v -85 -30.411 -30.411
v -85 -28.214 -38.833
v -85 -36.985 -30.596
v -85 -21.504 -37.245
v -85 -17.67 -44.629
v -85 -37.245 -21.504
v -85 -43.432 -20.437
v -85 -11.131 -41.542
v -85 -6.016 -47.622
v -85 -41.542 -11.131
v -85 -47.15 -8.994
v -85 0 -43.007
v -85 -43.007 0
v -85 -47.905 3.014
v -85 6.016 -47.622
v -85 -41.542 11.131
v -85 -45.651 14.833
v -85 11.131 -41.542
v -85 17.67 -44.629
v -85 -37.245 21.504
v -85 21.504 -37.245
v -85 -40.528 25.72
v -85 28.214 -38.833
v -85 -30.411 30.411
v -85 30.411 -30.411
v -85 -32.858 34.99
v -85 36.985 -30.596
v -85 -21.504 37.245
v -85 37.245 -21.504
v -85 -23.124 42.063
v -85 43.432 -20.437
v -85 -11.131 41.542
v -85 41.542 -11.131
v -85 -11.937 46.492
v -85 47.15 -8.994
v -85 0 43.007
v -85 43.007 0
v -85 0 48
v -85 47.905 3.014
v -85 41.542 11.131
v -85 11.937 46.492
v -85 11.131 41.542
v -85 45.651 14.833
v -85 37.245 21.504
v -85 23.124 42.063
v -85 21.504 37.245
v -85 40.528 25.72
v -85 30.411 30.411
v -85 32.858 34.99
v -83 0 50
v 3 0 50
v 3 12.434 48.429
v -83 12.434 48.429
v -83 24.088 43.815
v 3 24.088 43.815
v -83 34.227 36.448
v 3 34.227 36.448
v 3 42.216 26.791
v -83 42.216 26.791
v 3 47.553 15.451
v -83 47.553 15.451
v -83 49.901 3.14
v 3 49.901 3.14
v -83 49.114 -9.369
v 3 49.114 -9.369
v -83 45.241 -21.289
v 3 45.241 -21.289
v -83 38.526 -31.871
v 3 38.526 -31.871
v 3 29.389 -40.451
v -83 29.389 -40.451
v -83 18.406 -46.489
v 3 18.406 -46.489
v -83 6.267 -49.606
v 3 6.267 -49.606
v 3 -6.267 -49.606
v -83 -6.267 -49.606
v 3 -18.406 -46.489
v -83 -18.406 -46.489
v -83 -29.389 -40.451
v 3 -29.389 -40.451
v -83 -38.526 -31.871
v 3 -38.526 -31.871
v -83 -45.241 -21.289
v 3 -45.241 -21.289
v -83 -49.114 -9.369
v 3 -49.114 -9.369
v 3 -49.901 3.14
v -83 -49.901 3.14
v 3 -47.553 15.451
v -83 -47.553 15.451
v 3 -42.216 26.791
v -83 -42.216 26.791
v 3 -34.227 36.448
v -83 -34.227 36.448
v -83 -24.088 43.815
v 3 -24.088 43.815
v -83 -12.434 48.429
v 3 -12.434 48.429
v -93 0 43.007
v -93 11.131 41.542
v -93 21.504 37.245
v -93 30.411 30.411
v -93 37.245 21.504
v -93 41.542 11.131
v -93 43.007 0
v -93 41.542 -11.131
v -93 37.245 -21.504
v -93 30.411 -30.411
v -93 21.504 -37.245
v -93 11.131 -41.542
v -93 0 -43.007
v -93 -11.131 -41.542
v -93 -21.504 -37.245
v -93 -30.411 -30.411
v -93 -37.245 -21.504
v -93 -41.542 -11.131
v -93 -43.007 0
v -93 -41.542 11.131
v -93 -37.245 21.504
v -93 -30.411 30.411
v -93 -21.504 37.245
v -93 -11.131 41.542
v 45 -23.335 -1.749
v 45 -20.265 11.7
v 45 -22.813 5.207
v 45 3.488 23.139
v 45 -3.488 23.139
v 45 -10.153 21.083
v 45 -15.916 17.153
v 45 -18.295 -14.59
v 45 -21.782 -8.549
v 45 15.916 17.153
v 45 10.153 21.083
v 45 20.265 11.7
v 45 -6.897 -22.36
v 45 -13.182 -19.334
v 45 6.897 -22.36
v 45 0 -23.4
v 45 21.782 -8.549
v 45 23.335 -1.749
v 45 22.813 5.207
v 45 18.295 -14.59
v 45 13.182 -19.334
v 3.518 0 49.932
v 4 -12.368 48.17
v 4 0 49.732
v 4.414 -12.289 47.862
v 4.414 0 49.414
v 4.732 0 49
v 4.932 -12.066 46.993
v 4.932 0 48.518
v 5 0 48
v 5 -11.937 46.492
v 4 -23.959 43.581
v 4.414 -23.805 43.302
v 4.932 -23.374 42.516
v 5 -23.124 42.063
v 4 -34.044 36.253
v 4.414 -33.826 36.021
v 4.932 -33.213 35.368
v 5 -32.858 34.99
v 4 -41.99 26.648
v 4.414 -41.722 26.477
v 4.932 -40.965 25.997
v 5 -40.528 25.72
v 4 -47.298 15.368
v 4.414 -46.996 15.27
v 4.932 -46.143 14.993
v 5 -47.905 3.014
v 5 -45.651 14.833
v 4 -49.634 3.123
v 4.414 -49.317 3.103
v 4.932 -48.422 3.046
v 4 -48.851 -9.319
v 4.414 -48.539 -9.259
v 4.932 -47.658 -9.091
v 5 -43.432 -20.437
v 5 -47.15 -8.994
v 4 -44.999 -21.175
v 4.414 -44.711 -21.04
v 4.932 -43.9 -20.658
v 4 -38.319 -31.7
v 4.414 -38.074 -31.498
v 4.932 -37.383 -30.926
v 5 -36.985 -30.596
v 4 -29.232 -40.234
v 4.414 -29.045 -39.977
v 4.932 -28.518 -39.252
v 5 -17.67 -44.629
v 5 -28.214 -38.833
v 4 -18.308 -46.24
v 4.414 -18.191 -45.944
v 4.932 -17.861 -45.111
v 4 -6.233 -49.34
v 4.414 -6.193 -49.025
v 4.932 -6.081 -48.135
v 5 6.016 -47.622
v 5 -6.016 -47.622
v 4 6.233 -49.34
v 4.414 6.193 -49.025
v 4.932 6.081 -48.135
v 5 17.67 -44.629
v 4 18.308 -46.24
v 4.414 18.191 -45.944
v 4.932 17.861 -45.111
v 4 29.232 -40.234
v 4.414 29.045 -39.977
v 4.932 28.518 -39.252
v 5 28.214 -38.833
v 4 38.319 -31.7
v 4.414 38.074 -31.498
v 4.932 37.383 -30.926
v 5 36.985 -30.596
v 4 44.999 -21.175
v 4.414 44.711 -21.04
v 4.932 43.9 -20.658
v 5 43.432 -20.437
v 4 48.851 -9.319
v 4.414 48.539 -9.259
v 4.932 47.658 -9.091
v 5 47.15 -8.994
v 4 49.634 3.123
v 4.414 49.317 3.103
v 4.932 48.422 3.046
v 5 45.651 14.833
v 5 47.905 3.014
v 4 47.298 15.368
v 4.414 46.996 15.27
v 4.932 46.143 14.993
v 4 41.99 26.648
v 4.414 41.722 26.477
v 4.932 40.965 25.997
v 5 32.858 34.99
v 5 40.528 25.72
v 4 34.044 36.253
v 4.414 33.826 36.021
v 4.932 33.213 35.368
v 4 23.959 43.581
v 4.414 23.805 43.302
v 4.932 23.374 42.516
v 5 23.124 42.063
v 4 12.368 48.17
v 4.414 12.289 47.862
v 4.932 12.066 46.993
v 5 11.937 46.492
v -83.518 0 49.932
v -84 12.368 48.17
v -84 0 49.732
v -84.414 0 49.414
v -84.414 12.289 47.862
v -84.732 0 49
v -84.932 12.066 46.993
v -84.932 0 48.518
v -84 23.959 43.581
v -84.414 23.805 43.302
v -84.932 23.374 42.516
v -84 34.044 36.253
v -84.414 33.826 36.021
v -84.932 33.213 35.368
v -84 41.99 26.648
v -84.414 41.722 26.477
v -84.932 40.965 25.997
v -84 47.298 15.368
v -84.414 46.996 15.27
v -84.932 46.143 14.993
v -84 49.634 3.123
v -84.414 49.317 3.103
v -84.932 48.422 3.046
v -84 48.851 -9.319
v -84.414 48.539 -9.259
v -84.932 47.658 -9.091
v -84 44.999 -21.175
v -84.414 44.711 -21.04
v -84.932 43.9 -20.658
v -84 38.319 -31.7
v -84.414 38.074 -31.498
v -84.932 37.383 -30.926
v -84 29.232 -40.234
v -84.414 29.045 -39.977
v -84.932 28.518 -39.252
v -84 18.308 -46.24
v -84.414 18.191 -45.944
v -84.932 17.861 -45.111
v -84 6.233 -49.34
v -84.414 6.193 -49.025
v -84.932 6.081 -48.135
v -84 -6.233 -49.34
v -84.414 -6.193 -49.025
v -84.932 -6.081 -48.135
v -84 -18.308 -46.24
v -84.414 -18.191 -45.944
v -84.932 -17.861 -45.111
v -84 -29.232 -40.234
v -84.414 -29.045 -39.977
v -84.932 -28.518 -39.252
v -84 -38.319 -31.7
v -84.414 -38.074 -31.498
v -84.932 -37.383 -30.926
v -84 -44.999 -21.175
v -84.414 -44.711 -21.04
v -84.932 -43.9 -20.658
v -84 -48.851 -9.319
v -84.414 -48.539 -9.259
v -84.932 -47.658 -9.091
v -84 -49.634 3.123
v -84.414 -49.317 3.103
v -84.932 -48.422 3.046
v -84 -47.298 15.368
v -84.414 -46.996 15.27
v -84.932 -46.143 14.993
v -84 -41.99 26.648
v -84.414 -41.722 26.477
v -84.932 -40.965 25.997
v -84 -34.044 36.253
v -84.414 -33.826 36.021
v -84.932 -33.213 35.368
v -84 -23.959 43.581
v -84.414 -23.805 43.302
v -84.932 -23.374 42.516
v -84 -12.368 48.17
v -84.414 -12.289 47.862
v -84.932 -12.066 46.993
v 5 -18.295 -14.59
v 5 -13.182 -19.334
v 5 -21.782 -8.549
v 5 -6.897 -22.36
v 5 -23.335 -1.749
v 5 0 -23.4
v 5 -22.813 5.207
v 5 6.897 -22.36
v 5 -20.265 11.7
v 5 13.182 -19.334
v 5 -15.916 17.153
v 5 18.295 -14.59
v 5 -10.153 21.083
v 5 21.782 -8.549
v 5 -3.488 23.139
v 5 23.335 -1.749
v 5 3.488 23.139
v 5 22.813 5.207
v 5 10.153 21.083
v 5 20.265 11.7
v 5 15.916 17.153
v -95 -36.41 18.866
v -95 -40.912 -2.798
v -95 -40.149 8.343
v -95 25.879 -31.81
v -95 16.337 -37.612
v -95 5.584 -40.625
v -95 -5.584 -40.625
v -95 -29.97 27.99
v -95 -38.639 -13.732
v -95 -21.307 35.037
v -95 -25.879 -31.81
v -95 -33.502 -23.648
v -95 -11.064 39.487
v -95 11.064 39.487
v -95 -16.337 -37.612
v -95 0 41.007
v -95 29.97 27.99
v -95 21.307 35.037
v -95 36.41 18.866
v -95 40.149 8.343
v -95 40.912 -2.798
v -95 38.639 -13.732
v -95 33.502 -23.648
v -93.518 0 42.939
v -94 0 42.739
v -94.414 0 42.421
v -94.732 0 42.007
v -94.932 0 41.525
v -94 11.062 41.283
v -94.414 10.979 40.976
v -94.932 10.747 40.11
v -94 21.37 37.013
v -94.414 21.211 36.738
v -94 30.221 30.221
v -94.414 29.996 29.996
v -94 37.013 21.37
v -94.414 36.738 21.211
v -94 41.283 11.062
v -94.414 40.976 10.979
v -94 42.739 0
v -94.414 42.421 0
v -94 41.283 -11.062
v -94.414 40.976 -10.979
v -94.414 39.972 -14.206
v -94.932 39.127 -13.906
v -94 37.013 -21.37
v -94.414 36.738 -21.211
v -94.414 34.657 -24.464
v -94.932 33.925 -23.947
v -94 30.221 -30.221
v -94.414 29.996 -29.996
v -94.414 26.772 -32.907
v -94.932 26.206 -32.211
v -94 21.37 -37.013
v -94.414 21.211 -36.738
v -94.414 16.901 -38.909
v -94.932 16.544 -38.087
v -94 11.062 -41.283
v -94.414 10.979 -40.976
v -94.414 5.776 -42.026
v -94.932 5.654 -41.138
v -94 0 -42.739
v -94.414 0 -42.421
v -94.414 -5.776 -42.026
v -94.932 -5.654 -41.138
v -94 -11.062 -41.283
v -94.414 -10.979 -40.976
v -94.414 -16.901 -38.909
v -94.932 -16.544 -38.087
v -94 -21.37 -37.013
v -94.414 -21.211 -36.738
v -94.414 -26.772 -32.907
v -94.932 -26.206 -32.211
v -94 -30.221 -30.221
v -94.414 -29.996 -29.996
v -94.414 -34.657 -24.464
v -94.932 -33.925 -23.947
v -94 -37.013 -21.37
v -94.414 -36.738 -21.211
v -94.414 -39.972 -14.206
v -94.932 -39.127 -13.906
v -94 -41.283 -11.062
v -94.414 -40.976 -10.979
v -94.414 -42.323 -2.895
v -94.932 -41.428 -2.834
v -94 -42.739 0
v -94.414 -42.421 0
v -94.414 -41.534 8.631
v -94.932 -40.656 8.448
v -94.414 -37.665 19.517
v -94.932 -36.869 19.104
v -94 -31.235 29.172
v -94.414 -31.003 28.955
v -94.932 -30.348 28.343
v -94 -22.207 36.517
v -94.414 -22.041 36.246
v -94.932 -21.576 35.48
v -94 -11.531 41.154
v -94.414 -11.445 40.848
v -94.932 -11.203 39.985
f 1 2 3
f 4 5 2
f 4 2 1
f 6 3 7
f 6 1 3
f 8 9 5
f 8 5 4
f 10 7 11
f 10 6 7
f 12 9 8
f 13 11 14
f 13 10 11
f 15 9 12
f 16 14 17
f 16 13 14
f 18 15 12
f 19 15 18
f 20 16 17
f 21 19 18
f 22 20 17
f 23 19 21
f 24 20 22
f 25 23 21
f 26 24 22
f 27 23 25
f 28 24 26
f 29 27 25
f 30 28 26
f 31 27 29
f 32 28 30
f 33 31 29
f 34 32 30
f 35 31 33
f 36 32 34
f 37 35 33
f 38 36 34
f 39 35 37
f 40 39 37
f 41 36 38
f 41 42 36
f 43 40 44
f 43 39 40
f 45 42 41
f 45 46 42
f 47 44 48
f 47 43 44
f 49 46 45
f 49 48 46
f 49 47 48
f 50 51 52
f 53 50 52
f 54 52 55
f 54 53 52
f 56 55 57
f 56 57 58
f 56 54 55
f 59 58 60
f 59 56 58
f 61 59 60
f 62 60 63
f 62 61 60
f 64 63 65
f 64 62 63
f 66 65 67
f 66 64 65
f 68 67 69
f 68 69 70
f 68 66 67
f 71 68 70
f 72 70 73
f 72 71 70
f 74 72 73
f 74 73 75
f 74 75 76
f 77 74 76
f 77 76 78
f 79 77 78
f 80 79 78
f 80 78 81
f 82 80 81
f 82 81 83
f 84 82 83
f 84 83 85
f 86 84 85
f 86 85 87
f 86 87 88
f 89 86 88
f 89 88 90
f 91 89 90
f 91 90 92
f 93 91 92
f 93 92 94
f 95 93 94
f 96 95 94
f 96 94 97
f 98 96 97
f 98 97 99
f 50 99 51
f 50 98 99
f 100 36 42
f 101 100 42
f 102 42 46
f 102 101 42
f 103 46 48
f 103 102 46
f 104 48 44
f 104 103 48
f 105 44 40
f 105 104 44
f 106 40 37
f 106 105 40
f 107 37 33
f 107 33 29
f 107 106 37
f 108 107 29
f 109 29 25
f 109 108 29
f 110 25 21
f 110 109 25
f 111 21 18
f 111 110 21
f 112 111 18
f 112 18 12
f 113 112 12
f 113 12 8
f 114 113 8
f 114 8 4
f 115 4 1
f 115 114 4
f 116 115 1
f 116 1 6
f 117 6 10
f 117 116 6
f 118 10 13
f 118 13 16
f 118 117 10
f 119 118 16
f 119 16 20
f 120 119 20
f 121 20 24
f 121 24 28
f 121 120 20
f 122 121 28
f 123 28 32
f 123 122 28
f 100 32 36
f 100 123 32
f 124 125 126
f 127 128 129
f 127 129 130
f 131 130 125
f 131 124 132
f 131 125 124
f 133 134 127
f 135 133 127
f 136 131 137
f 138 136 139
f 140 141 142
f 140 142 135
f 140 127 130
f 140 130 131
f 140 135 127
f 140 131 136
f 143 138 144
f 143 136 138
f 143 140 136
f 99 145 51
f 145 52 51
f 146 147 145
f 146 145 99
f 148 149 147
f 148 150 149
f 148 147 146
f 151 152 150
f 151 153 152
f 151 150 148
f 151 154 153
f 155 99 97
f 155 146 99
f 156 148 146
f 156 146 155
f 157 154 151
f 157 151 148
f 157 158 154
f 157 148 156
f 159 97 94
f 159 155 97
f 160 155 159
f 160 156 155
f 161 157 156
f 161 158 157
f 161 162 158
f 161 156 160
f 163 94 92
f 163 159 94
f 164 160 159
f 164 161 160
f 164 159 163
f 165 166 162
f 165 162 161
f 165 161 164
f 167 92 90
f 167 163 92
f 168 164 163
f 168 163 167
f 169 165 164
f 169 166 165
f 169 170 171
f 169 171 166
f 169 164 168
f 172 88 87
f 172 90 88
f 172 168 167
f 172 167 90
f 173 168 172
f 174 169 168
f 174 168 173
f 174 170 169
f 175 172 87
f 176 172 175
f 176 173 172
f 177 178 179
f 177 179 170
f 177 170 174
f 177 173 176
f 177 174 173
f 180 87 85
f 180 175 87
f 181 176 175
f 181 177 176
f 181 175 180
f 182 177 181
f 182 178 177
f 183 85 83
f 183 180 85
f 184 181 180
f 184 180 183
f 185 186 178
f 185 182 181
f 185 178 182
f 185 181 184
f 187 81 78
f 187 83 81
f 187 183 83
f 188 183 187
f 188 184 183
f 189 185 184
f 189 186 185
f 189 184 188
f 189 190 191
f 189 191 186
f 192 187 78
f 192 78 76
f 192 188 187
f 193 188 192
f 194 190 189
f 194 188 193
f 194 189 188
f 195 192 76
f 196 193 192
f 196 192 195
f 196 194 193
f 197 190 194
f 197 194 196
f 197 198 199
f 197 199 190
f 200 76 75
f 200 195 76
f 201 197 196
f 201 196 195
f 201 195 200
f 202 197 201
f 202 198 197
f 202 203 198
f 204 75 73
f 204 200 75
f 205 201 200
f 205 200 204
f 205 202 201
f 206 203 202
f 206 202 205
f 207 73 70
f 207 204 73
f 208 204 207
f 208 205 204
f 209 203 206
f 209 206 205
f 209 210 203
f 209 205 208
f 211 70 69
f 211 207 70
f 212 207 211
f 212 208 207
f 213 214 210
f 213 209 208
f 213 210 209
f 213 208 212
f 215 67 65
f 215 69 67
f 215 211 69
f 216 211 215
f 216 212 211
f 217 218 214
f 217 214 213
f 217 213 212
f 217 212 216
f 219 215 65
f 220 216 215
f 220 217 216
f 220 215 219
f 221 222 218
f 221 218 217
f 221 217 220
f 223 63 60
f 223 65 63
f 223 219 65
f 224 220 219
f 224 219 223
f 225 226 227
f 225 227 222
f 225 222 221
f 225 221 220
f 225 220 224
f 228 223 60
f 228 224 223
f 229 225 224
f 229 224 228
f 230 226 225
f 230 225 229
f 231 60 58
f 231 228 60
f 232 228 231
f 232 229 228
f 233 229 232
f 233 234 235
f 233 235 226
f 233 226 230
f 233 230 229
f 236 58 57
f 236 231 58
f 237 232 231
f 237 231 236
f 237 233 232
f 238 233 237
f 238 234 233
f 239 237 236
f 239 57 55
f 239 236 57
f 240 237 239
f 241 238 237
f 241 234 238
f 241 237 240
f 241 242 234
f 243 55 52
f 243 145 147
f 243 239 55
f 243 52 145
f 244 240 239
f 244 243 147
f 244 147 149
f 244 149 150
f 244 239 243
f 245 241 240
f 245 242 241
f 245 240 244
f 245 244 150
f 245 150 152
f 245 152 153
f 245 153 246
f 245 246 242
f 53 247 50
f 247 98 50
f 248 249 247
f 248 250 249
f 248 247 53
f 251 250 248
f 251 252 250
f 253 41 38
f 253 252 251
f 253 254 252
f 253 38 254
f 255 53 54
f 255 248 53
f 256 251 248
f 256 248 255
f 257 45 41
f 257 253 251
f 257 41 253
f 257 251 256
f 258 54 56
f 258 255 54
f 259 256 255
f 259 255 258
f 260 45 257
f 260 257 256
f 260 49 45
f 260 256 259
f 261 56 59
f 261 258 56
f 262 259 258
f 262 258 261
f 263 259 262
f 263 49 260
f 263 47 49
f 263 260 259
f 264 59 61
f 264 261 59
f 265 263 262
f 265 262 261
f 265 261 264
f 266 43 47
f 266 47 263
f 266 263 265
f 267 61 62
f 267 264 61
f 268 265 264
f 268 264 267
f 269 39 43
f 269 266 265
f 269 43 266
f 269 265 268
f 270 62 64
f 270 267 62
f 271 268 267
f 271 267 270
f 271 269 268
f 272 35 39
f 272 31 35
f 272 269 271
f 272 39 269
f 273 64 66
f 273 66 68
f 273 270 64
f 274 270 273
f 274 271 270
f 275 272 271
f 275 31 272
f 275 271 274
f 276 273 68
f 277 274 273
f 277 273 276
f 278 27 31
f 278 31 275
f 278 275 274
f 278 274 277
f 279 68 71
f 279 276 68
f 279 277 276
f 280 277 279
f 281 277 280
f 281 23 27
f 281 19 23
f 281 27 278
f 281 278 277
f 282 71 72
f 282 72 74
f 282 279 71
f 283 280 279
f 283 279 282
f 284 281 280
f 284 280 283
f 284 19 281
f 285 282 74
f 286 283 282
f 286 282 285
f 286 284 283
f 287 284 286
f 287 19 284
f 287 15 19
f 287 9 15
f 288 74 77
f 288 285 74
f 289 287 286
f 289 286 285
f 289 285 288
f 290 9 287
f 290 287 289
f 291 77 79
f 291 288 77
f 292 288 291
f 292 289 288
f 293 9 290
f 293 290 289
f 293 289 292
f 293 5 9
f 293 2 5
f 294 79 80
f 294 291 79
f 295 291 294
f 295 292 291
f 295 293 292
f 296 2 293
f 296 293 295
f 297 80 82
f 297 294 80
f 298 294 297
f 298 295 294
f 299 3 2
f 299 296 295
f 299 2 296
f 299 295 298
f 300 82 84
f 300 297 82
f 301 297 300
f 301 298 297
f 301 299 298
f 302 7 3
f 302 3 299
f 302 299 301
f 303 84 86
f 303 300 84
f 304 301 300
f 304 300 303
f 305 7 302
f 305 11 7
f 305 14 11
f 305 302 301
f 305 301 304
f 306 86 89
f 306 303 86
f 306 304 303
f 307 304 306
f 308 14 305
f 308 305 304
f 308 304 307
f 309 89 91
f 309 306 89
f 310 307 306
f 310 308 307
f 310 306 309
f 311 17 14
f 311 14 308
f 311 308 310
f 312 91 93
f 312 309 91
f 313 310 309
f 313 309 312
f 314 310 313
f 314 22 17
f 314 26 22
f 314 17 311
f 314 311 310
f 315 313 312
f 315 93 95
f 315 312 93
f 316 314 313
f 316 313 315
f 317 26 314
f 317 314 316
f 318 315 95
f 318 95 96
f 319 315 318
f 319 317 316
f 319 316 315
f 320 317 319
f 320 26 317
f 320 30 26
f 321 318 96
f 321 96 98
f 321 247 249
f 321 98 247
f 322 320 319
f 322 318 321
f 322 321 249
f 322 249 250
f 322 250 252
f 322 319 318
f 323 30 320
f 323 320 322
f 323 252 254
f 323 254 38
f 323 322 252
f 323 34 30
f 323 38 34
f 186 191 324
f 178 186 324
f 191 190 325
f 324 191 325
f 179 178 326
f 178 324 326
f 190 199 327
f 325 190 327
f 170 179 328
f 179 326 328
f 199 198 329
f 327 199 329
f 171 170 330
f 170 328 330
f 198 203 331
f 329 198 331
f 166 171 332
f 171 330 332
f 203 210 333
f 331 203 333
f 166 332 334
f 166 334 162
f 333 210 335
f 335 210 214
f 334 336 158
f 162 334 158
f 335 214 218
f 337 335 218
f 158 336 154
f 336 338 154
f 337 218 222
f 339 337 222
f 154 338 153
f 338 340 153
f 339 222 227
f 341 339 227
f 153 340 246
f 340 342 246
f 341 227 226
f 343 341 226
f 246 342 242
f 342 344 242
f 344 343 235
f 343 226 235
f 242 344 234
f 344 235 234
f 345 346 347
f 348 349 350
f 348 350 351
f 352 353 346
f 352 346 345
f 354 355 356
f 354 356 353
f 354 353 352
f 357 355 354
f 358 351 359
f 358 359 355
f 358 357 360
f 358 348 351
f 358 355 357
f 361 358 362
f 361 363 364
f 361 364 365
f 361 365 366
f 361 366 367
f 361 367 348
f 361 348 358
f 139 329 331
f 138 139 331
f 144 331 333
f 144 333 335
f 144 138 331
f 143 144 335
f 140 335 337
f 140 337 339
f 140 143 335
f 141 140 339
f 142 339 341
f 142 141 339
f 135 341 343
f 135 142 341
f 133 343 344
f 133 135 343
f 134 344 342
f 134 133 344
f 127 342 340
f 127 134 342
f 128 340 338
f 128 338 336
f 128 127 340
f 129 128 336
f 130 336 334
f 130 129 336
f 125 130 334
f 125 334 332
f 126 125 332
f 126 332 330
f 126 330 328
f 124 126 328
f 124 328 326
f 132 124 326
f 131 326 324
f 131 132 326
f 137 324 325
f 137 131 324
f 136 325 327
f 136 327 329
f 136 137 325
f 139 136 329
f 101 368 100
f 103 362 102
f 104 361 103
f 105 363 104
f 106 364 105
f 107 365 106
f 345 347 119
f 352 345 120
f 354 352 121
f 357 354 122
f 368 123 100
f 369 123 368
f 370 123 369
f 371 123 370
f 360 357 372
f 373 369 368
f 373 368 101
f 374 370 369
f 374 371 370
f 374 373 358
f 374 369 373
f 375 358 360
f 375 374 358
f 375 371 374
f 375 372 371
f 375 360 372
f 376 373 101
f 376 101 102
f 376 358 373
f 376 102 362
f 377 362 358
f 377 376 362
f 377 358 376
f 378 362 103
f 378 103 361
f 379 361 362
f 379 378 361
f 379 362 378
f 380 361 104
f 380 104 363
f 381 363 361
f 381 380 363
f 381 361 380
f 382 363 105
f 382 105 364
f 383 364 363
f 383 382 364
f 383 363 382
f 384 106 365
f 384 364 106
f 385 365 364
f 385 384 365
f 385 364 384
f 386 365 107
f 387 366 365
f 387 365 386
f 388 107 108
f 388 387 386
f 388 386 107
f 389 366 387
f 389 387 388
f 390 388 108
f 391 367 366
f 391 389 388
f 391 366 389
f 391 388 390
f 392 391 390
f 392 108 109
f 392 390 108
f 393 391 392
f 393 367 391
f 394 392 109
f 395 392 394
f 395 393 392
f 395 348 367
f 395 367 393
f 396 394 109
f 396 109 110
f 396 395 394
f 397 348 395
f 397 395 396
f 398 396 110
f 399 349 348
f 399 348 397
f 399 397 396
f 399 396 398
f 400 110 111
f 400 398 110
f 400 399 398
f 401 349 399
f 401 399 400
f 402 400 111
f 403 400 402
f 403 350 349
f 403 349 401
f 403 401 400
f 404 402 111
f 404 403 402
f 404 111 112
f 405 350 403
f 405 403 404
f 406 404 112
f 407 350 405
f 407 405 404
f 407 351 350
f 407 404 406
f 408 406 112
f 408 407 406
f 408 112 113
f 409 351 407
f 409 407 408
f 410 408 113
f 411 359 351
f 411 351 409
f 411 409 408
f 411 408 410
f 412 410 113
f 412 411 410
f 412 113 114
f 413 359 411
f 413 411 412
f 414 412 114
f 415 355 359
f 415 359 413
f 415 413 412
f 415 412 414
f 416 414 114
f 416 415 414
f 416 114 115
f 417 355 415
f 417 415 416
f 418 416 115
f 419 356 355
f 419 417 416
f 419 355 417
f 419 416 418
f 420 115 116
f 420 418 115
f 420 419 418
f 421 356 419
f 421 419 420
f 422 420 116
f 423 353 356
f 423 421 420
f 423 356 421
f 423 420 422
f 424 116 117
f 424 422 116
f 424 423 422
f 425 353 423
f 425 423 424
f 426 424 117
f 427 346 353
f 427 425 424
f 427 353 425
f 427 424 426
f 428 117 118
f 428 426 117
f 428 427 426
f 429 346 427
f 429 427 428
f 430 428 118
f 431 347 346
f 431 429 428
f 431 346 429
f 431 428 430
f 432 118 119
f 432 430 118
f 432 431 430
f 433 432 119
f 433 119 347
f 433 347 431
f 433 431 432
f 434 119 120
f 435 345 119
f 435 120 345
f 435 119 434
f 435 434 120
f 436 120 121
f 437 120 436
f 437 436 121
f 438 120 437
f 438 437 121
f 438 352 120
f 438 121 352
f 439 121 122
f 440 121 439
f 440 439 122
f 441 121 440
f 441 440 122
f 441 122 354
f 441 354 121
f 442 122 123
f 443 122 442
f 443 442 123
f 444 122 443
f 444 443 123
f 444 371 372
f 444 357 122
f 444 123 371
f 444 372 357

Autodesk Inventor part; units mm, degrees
ref_plane "YZ Plane" through (0, 0, 0) normal (1, 0, 0) x (0, 1, 0)
ref_plane "XZ Plane" through (0, 0, 0) normal (0, 1, 0) x (-1, 0, 0)
ref_plane "XY Plane" through (0, 0, 0) normal (0, 0, 1) x (1, 0, 0)
sketch "Sketch3" plane through (0, 0, 0) normal (1, 0, 0) x (0, 1, 0)
  circle A0 centre (0, 0) radius 11.7
  dimension "d1" = 23.4
extrude "Extrusion1" add sketch "Sketch3" along normal mid plane 90
sketch "Sketch4" plane through (45, 0, 0) normal (1, 0, 0) x (0, 0, -1)
  point P0 (0, 0)
sketch "Sketch5" plane through (-45, 0, 0) normal (-1, 0, 0) x (0, 0, 1)
  circle A0 centre (0, 0) radius 11.7 projected
  circle A1 centre (0, 0) radius 50
  dimension "d4" = 100
extrude "Extrusion2" add sketch "Sketch5" along normal mid plane 100 contours A0 | A1
sketch "Sketch6" plane through (-95, 0, 0) normal (-1, 0, 0) x (0, 0, 1)
  circle A0 centre (0, 0) radius 11.7 projected
  circle A1 centre (0, 0) radius 43.0072
  circle A2 centre (0, 0) radius 50
extrude "Extrusion3" cut sketch "Sketch6" against normal blind 10 contours A2
fillet "Fillet1" radius 2 1 edges at (-85, 0, -50)
fillet "Fillet2" radius 2 1 edges at (-95, 0, -43.0072)
thread "Thread1" size "M90x6" class "6g" standard "ANSI Metric M Profile" full length
fillet "Fillet3" radius 2 1 edges at (5, 0, -50)
sketch "Sketch7" plane through (45, 0, 0) normal (1, 0, 0) x (0, 0, -1)
  circle A0 centre (0, 0) radius 23.4
  dimension "d14" = 46.8
extrude "Extrusion4" add sketch "Sketch7" against normal blind 50
properties part number "Motor"
